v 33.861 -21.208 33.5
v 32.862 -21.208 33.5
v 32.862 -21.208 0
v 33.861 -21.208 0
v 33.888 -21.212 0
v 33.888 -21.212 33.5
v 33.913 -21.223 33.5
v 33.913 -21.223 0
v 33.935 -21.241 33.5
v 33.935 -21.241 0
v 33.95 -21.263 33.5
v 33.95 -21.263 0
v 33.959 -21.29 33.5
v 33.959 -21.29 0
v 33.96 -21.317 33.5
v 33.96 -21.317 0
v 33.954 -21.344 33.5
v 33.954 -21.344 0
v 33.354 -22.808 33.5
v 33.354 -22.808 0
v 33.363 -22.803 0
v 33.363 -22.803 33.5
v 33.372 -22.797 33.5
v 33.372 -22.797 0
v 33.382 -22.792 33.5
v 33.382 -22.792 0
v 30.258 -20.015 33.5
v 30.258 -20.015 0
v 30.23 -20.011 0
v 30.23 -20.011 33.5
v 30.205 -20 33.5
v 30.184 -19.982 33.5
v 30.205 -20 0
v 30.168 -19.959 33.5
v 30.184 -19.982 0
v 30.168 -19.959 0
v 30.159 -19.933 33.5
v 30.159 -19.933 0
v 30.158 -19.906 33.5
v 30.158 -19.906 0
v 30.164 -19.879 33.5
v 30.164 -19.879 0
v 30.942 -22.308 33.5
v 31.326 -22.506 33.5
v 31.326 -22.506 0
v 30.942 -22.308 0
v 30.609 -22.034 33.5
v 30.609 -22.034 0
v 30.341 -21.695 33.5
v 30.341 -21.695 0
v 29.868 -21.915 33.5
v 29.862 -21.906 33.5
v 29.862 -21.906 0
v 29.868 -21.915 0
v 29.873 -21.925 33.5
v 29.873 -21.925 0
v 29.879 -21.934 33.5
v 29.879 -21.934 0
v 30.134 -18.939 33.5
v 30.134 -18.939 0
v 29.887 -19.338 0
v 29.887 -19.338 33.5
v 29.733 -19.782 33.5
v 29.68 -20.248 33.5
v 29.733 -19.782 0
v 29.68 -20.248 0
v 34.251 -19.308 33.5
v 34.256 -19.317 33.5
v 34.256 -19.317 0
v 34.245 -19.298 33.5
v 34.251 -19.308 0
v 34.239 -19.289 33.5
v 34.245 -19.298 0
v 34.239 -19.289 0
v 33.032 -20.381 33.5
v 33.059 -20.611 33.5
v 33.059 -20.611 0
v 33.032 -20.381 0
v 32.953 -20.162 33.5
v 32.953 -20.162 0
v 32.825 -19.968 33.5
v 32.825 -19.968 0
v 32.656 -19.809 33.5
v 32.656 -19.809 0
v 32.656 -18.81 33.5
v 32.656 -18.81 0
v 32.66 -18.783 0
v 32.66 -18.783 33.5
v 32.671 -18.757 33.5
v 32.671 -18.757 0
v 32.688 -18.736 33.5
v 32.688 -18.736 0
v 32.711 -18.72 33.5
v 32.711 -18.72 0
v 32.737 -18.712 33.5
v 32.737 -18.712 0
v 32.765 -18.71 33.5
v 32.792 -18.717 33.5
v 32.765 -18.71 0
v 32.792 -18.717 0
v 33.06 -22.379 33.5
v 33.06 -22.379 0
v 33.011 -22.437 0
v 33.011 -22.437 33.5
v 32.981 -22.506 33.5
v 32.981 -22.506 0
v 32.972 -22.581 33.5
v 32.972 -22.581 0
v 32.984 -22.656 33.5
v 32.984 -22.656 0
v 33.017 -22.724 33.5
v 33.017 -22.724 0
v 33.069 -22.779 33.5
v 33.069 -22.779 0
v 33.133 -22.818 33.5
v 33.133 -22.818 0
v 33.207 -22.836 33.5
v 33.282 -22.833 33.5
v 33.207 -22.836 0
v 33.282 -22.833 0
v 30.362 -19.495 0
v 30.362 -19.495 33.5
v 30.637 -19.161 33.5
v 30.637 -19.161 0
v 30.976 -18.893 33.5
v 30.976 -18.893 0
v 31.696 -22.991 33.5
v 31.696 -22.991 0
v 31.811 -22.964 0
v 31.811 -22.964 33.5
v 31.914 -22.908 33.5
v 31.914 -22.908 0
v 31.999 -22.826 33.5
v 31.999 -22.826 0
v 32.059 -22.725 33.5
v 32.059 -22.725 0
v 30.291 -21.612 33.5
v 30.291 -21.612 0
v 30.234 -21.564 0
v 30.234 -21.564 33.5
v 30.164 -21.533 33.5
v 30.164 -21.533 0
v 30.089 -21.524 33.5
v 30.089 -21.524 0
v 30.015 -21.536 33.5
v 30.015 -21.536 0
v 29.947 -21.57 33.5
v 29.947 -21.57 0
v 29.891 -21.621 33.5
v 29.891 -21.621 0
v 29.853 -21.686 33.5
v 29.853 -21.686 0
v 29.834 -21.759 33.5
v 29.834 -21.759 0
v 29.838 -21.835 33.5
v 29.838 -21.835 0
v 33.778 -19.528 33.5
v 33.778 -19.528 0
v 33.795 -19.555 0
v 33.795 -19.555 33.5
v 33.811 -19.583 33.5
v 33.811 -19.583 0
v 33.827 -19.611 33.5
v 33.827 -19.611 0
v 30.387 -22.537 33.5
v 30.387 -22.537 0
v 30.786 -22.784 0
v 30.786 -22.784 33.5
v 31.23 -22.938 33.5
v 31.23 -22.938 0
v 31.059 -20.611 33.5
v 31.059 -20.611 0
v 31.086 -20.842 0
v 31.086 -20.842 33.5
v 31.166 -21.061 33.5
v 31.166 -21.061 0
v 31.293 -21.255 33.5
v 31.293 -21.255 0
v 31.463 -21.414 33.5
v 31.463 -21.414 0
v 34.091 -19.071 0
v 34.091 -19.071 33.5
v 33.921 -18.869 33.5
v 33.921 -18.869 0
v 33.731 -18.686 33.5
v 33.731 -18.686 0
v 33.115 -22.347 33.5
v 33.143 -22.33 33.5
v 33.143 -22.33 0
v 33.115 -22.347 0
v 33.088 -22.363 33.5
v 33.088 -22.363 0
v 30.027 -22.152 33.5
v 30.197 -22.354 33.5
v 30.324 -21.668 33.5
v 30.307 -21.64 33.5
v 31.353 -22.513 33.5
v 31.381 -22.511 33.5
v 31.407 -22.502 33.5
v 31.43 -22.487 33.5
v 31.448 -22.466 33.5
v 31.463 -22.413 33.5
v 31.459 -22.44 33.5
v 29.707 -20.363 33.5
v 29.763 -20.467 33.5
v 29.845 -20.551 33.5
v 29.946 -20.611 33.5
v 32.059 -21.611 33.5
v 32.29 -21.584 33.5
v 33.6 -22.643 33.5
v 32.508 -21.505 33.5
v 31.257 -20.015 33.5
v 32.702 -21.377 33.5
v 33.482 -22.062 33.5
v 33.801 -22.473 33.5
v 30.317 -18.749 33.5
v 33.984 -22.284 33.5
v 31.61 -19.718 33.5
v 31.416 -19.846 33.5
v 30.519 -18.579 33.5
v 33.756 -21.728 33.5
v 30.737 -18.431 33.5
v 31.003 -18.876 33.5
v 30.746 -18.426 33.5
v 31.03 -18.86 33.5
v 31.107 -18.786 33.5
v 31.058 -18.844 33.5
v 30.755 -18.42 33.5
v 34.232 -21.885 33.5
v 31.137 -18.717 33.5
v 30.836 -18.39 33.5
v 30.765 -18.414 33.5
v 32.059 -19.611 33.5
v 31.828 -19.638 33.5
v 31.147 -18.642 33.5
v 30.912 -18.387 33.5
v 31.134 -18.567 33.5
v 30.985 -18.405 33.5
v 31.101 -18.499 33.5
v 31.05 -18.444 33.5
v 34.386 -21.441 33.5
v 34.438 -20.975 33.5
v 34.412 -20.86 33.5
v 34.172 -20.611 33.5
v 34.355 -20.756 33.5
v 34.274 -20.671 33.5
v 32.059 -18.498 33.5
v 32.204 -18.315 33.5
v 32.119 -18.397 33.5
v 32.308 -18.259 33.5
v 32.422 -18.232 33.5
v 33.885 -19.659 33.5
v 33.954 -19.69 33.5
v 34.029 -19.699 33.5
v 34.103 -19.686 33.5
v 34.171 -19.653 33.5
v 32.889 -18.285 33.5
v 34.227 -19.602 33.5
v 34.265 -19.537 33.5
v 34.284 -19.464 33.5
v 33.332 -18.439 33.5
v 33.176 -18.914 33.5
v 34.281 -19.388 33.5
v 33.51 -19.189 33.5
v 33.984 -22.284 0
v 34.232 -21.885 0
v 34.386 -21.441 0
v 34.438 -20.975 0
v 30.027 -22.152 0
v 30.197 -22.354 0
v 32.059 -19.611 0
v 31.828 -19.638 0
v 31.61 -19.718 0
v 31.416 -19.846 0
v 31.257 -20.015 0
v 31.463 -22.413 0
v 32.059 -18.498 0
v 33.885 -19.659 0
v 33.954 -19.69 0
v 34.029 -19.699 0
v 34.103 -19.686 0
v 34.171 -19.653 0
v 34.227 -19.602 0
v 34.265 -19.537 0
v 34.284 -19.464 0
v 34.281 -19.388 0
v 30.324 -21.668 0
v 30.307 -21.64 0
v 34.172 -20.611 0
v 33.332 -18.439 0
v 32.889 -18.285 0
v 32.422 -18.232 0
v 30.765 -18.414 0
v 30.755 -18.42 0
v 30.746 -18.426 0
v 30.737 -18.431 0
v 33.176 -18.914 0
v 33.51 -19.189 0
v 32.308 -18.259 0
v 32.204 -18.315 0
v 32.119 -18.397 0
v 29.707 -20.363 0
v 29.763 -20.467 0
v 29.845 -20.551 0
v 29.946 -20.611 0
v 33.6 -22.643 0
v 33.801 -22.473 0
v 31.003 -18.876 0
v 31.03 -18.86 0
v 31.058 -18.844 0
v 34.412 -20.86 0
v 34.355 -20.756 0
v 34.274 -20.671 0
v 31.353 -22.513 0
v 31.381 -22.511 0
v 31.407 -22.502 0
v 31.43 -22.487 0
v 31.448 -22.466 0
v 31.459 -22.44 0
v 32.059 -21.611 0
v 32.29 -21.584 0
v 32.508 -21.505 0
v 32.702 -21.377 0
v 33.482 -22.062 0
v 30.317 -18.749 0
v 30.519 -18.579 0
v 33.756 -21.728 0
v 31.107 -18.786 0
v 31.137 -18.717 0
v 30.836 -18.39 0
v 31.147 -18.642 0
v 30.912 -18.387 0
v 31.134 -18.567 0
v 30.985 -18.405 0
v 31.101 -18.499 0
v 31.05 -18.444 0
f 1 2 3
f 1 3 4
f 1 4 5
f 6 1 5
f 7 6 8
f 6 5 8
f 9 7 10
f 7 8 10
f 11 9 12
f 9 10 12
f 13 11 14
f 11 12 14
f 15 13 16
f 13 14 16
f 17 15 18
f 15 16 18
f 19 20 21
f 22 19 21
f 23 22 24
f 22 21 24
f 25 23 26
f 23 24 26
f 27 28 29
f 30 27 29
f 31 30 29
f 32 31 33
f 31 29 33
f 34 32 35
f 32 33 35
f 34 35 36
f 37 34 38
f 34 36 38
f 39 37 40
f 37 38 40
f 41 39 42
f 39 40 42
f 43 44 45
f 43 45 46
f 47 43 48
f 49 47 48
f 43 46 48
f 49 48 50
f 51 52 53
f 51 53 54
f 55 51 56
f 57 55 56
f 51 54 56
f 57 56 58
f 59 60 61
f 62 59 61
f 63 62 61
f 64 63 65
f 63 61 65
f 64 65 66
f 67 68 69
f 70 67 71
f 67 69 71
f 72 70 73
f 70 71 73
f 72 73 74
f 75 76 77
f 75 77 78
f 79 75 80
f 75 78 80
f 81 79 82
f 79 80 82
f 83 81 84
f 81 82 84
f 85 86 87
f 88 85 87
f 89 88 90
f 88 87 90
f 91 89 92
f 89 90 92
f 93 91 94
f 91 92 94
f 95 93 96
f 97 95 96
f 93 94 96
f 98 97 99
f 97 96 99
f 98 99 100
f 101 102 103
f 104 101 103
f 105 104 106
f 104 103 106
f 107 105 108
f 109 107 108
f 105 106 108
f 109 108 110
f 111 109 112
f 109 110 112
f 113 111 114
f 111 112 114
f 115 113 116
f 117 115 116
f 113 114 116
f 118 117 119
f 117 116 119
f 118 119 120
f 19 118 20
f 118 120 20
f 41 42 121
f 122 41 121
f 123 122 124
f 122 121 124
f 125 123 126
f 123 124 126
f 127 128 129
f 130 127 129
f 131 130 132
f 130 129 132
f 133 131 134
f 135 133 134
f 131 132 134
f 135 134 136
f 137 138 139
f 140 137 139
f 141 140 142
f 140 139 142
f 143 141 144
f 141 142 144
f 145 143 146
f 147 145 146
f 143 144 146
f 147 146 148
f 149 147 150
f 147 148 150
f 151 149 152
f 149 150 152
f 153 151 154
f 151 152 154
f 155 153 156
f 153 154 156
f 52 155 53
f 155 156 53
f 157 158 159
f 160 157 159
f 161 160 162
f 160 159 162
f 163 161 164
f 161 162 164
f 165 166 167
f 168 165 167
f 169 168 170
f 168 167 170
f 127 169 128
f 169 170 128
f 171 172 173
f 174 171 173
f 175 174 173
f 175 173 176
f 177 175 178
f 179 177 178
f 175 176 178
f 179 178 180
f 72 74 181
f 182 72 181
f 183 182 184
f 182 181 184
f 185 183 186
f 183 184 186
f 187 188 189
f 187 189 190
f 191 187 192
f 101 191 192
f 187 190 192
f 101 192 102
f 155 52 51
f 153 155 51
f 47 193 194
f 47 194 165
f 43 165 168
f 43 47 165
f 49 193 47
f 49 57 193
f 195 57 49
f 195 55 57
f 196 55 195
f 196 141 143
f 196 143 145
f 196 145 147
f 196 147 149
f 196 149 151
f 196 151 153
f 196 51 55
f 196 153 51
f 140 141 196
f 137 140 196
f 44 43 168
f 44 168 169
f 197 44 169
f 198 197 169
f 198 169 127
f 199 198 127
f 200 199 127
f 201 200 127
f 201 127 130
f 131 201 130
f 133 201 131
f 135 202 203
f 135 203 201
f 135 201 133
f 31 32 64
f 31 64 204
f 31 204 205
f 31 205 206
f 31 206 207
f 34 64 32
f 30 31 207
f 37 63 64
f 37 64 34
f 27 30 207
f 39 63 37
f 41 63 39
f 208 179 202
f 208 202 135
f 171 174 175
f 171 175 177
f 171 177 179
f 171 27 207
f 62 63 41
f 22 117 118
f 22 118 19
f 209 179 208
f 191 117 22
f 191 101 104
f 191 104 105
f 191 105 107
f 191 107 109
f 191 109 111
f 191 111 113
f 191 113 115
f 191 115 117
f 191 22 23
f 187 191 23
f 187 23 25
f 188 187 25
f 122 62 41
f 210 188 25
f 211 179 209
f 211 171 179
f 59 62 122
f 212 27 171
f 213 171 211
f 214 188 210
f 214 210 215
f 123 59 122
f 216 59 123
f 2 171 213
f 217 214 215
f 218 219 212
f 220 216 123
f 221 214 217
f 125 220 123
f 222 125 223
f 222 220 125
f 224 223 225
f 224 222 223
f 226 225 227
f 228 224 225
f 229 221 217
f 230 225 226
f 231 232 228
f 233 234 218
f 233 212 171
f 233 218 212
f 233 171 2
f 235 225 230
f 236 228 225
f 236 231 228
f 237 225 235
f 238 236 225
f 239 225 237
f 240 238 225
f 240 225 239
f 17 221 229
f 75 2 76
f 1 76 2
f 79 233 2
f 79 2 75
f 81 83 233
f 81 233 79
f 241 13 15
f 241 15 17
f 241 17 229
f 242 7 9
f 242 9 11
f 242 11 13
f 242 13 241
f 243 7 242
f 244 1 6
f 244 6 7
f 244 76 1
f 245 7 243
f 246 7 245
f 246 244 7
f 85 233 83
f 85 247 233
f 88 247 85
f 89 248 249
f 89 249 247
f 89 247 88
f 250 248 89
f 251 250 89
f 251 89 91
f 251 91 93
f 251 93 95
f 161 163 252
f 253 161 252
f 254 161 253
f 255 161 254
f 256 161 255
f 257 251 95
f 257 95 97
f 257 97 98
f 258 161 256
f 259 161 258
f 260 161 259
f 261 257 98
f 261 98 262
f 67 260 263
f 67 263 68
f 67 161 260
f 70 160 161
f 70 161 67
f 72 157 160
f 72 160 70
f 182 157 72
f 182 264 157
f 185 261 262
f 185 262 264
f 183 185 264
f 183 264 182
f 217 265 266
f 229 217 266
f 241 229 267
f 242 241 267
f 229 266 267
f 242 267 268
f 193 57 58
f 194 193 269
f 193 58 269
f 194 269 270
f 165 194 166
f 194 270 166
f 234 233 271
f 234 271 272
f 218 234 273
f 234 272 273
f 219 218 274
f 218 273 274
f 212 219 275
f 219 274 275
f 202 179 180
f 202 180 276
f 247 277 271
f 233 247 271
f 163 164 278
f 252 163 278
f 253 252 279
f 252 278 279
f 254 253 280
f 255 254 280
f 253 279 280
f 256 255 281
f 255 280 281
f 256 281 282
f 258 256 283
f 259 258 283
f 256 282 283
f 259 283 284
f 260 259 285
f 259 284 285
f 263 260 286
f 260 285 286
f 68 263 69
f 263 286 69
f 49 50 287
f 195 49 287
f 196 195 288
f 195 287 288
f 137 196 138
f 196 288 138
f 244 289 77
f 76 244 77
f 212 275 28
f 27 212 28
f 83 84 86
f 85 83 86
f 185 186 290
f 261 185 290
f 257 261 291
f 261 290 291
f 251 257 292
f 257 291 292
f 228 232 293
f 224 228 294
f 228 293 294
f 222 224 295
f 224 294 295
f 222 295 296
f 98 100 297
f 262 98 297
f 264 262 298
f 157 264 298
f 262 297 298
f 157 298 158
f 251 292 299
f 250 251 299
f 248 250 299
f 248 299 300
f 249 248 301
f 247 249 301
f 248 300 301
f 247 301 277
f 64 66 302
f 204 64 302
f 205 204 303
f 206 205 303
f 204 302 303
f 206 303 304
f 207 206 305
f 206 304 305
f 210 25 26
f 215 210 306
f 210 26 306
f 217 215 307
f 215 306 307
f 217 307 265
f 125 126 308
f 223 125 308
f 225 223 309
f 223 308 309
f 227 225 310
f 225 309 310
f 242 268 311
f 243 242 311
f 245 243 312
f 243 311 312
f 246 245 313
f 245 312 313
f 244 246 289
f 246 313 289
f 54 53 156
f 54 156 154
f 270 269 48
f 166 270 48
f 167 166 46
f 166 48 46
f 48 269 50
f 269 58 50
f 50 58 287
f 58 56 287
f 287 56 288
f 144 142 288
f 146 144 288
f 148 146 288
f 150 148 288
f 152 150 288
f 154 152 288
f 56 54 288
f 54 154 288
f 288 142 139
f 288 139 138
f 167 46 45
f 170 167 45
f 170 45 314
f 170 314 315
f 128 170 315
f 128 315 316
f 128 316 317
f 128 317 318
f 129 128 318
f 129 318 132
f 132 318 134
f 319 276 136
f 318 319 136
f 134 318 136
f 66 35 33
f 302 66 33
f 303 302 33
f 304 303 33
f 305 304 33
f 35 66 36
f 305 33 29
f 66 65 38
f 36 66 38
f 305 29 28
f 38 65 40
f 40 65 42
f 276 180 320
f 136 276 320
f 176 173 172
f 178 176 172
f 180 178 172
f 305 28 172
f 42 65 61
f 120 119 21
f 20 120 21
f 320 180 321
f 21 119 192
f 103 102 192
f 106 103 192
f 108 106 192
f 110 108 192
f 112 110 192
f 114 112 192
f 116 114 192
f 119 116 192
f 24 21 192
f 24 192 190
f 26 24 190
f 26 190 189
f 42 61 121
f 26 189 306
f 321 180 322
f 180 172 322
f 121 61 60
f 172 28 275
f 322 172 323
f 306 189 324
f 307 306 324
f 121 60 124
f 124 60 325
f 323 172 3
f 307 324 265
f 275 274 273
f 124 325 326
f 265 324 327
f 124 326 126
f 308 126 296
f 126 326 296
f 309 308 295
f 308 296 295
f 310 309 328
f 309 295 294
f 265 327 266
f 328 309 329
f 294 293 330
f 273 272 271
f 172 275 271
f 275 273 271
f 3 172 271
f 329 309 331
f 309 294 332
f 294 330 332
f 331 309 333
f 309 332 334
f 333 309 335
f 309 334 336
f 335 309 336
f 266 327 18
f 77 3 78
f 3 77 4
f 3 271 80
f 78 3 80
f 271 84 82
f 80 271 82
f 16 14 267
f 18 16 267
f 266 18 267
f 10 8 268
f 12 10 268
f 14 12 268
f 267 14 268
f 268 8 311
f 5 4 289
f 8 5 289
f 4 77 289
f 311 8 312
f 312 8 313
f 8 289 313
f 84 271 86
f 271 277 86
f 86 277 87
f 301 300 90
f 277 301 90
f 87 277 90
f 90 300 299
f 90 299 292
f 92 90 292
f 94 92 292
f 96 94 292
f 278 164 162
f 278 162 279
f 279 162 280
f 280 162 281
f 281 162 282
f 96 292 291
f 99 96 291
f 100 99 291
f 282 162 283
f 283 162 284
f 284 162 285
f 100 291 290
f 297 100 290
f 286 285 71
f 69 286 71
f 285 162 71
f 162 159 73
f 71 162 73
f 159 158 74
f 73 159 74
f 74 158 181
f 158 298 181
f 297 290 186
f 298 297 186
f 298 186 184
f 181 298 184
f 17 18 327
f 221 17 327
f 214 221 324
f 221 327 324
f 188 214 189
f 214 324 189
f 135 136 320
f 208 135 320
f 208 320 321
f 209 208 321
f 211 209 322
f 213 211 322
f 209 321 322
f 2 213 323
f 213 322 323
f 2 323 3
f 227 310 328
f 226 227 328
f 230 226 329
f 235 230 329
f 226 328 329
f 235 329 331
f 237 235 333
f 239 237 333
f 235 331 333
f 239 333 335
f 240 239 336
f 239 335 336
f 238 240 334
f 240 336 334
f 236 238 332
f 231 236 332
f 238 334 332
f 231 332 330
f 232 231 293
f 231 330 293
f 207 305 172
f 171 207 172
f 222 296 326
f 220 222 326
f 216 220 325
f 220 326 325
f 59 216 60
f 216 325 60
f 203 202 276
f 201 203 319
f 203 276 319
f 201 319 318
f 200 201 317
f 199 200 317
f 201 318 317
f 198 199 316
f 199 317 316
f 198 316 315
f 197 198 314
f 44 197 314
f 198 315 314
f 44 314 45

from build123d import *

# Parameters (mm, degrees)
F1_DEPTH = 33.5


with BuildPart() as f1:
    # F0 (on Top) → F1 (new body)
    with BuildSketch(Plane.XY):
        with BuildLine():
            Line((29.94595, -20.611431), (31.05914, -20.611431))
            ThreePointArc((31.05914, -20.611431), (31.165654, -21.060523), (31.462508, -21.413946))
            Line((31.462508, -21.413946), (31.462508, -22.412999))
            ThreePointArc((31.462508, -22.412999), (31.419048, -22.495481), (31.326442, -22.506268))
            ThreePointArc((31.326442, -22.506268), (30.768165, -22.180073), (30.340659, -21.69498))
            ThreePointArc((30.340659, -21.69498), (30.315465, -21.653954), (30.291251, -21.612342))
            ThreePointArc((30.291251, -21.612342), (29.946997, -21.569618), (29.86218, -21.905984))
            ThreePointArc((29.86218, -21.905984), (29.870461, -21.919935), (29.87883, -21.933833))
            ThreePointArc((29.87883, -21.933833), (30.109494, -22.255018), (30.38704, -22.53668))
            ThreePointArc((30.38704, -22.53668), (31.003517, -22.873177), (31.695966, -22.990602))
            ThreePointArc((31.695966, -22.990602), (31.914277, -22.907755), (32.05914, -22.72462))
            Line((32.05914, -22.72462), (32.05914, -21.611431))
            ThreePointArc((32.05914, -21.611431), (32.508232, -21.504916), (32.861655, -21.208062))
            Line((32.861655, -21.208062), (33.860708, -21.208062))
            ThreePointArc((33.860708, -21.208062), (33.94319, -21.251523), (33.953977, -21.344128))
            ThreePointArc((33.953977, -21.344128), (33.627782, -21.902405), (33.142689, -22.329911))
            ThreePointArc((33.142689, -22.329911), (33.101663, -22.355105), (33.060051, -22.37932))
            ThreePointArc((33.060051, -22.37932), (33.017327, -22.723574), (33.353693, -22.80839))
            ThreePointArc((33.353693, -22.80839), (33.367644, -22.80011), (33.381542, -22.79174))
            ThreePointArc((33.381542, -22.79174), (33.702727, -22.561077), (33.984389, -22.28353))
            ThreePointArc((33.984389, -22.28353), (34.320886, -21.667053), (34.438311, -20.974605))
            ThreePointArc((34.438311, -20.974605), (34.355464, -20.756293), (34.172329, -20.611431))
            Line((34.172329, -20.611431), (33.05914, -20.611431))
            ThreePointArc((33.05914, -20.611431), (32.952625, -20.162338), (32.655771, -19.808915))
            Line((32.655771, -19.808915), (32.655771, -18.809863))
            ThreePointArc((32.655771, -18.809863), (32.699232, -18.727381), (32.791837, -18.716593))
            ThreePointArc((32.791837, -18.716593), (33.350114, -19.042788), (33.777621, -19.527881))
            ThreePointArc((33.777621, -19.527881), (33.802814, -19.568907), (33.827029, -19.610519))
            ThreePointArc((33.827029, -19.610519), (34.171283, -19.653243), (34.256099, -19.316877))
            ThreePointArc((34.256099, -19.316877), (34.247819, -19.302926), (34.23945, -19.289028))
            ThreePointArc((34.23945, -19.289028), (34.008786, -18.967843), (33.731239, -18.686181))
            ThreePointArc((33.731239, -18.686181), (33.114763, -18.349684), (32.422314, -18.232259))
            ThreePointArc((32.422314, -18.232259), (32.204002, -18.315107), (32.05914, -18.498241))
            Line((32.05914, -18.498241), (32.05914, -19.611431))
            ThreePointArc((32.05914, -19.611431), (31.610047, -19.717945), (31.256624, -20.014799))
            Line((31.256624, -20.014799), (30.257572, -20.014799))
            ThreePointArc((30.257572, -20.014799), (30.17509, -19.971339), (30.164302, -19.878733))
            ThreePointArc((30.164302, -19.878733), (30.490497, -19.320456), (30.97559, -18.89295))
            ThreePointArc((30.97559, -18.89295), (31.016617, -18.867756), (31.058228, -18.843542))
            ThreePointArc((31.058228, -18.843542), (31.100953, -18.499287), (30.764586, -18.414471))
            ThreePointArc((30.764586, -18.414471), (30.750635, -18.422752), (30.736737, -18.431121))
            ThreePointArc((30.736737, -18.431121), (30.415552, -18.661785), (30.133891, -18.939331))
            ThreePointArc((30.133891, -18.939331), (29.797393, -19.555808), (29.679968, -20.248257))
            ThreePointArc((29.679968, -20.248257), (29.762816, -20.466568), (29.94595, -20.611431))
        make_face()
    extrude(amount=F1_DEPTH)


solid = f1.part
